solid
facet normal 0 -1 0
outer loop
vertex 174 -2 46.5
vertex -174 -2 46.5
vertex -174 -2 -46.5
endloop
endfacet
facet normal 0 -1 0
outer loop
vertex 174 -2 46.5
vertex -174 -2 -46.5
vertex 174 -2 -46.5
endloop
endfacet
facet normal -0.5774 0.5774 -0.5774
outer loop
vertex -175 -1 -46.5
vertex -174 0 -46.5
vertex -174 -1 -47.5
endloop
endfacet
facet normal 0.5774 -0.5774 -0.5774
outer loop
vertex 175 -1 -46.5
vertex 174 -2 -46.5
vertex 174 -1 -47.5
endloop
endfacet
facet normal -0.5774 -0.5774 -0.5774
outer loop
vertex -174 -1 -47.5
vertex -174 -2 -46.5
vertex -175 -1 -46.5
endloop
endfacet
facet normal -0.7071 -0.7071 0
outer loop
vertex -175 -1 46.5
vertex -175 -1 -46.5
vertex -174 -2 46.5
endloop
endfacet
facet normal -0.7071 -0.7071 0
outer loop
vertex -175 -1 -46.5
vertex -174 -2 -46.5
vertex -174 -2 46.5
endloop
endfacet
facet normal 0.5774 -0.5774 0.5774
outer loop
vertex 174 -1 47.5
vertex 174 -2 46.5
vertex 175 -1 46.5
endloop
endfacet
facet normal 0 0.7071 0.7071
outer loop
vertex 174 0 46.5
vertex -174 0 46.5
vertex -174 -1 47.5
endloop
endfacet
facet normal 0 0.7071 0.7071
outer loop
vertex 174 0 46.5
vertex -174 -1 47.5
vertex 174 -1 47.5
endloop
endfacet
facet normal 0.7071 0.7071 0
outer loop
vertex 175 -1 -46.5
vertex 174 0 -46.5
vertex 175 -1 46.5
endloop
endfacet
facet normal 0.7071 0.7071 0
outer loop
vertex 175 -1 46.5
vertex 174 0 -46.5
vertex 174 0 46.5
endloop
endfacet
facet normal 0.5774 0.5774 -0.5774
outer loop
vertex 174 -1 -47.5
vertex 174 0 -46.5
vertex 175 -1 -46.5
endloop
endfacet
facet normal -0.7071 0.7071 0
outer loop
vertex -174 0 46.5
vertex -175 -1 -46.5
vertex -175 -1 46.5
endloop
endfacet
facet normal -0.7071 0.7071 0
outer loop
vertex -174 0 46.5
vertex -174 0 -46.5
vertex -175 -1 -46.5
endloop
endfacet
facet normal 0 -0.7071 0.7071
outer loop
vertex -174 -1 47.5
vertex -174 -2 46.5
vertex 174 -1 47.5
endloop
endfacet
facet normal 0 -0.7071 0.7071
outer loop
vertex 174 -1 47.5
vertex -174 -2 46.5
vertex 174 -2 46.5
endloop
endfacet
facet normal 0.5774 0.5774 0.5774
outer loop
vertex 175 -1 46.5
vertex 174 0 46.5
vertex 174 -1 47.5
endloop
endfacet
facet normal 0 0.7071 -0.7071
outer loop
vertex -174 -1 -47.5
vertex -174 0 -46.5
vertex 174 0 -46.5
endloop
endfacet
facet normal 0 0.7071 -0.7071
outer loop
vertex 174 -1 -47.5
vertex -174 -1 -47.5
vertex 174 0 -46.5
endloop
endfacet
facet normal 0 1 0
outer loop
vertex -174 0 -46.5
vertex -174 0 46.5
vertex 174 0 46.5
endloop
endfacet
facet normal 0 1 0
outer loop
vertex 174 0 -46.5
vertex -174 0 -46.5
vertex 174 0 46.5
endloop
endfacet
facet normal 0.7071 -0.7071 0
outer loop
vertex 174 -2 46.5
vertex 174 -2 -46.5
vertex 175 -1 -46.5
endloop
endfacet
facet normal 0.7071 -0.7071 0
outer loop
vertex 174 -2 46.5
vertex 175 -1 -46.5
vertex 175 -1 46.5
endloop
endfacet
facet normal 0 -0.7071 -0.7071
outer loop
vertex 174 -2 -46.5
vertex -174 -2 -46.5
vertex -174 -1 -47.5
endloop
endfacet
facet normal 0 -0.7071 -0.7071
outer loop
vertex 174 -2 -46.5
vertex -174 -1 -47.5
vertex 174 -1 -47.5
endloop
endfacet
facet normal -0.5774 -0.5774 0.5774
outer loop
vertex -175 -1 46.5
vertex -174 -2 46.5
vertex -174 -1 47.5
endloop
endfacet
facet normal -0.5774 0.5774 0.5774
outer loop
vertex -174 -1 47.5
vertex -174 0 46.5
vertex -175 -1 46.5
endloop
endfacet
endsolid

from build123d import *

# Parameters (mm, degrees)
F0_W     = 350
F0_H     = 95
F1_DEPTH = 2
F2_SIZE  = 0.99999


# Not quite as in the source:
# - a fillet or chamfer is up to 0.001 mm smaller than in the source, because OpenCascade refuses the exact size


with BuildPart() as f1:
    # F0 (on Front) → F1 (new body)
    with BuildSketch(Plane.XZ):
        Rectangle(F0_W, F0_H)
    extrude(amount=F1_DEPTH)

    # F2 (size 1 in the source; OpenCascade refuses exactly that, so slightly less here)
    f2_edges = [f1.edges().sort_by_distance(p)[0] for p in [
        (-175, -2, 0),
        (0, -2, 47.5),
        (0, -2, -47.5),
        (175, -2, 0),
        (-175, 0, 0),
        (0, 0, 47.5),
        (175, 0, 0),
        (0, 0, -47.5),
        (175, -1, -47.5),
        (175, -1, 47.5),
        (-175, -1, -47.5),
        (-175, -1, 47.5),
    ]]
    chamfer(f2_edges, length=F2_SIZE)


solid = f1.part
